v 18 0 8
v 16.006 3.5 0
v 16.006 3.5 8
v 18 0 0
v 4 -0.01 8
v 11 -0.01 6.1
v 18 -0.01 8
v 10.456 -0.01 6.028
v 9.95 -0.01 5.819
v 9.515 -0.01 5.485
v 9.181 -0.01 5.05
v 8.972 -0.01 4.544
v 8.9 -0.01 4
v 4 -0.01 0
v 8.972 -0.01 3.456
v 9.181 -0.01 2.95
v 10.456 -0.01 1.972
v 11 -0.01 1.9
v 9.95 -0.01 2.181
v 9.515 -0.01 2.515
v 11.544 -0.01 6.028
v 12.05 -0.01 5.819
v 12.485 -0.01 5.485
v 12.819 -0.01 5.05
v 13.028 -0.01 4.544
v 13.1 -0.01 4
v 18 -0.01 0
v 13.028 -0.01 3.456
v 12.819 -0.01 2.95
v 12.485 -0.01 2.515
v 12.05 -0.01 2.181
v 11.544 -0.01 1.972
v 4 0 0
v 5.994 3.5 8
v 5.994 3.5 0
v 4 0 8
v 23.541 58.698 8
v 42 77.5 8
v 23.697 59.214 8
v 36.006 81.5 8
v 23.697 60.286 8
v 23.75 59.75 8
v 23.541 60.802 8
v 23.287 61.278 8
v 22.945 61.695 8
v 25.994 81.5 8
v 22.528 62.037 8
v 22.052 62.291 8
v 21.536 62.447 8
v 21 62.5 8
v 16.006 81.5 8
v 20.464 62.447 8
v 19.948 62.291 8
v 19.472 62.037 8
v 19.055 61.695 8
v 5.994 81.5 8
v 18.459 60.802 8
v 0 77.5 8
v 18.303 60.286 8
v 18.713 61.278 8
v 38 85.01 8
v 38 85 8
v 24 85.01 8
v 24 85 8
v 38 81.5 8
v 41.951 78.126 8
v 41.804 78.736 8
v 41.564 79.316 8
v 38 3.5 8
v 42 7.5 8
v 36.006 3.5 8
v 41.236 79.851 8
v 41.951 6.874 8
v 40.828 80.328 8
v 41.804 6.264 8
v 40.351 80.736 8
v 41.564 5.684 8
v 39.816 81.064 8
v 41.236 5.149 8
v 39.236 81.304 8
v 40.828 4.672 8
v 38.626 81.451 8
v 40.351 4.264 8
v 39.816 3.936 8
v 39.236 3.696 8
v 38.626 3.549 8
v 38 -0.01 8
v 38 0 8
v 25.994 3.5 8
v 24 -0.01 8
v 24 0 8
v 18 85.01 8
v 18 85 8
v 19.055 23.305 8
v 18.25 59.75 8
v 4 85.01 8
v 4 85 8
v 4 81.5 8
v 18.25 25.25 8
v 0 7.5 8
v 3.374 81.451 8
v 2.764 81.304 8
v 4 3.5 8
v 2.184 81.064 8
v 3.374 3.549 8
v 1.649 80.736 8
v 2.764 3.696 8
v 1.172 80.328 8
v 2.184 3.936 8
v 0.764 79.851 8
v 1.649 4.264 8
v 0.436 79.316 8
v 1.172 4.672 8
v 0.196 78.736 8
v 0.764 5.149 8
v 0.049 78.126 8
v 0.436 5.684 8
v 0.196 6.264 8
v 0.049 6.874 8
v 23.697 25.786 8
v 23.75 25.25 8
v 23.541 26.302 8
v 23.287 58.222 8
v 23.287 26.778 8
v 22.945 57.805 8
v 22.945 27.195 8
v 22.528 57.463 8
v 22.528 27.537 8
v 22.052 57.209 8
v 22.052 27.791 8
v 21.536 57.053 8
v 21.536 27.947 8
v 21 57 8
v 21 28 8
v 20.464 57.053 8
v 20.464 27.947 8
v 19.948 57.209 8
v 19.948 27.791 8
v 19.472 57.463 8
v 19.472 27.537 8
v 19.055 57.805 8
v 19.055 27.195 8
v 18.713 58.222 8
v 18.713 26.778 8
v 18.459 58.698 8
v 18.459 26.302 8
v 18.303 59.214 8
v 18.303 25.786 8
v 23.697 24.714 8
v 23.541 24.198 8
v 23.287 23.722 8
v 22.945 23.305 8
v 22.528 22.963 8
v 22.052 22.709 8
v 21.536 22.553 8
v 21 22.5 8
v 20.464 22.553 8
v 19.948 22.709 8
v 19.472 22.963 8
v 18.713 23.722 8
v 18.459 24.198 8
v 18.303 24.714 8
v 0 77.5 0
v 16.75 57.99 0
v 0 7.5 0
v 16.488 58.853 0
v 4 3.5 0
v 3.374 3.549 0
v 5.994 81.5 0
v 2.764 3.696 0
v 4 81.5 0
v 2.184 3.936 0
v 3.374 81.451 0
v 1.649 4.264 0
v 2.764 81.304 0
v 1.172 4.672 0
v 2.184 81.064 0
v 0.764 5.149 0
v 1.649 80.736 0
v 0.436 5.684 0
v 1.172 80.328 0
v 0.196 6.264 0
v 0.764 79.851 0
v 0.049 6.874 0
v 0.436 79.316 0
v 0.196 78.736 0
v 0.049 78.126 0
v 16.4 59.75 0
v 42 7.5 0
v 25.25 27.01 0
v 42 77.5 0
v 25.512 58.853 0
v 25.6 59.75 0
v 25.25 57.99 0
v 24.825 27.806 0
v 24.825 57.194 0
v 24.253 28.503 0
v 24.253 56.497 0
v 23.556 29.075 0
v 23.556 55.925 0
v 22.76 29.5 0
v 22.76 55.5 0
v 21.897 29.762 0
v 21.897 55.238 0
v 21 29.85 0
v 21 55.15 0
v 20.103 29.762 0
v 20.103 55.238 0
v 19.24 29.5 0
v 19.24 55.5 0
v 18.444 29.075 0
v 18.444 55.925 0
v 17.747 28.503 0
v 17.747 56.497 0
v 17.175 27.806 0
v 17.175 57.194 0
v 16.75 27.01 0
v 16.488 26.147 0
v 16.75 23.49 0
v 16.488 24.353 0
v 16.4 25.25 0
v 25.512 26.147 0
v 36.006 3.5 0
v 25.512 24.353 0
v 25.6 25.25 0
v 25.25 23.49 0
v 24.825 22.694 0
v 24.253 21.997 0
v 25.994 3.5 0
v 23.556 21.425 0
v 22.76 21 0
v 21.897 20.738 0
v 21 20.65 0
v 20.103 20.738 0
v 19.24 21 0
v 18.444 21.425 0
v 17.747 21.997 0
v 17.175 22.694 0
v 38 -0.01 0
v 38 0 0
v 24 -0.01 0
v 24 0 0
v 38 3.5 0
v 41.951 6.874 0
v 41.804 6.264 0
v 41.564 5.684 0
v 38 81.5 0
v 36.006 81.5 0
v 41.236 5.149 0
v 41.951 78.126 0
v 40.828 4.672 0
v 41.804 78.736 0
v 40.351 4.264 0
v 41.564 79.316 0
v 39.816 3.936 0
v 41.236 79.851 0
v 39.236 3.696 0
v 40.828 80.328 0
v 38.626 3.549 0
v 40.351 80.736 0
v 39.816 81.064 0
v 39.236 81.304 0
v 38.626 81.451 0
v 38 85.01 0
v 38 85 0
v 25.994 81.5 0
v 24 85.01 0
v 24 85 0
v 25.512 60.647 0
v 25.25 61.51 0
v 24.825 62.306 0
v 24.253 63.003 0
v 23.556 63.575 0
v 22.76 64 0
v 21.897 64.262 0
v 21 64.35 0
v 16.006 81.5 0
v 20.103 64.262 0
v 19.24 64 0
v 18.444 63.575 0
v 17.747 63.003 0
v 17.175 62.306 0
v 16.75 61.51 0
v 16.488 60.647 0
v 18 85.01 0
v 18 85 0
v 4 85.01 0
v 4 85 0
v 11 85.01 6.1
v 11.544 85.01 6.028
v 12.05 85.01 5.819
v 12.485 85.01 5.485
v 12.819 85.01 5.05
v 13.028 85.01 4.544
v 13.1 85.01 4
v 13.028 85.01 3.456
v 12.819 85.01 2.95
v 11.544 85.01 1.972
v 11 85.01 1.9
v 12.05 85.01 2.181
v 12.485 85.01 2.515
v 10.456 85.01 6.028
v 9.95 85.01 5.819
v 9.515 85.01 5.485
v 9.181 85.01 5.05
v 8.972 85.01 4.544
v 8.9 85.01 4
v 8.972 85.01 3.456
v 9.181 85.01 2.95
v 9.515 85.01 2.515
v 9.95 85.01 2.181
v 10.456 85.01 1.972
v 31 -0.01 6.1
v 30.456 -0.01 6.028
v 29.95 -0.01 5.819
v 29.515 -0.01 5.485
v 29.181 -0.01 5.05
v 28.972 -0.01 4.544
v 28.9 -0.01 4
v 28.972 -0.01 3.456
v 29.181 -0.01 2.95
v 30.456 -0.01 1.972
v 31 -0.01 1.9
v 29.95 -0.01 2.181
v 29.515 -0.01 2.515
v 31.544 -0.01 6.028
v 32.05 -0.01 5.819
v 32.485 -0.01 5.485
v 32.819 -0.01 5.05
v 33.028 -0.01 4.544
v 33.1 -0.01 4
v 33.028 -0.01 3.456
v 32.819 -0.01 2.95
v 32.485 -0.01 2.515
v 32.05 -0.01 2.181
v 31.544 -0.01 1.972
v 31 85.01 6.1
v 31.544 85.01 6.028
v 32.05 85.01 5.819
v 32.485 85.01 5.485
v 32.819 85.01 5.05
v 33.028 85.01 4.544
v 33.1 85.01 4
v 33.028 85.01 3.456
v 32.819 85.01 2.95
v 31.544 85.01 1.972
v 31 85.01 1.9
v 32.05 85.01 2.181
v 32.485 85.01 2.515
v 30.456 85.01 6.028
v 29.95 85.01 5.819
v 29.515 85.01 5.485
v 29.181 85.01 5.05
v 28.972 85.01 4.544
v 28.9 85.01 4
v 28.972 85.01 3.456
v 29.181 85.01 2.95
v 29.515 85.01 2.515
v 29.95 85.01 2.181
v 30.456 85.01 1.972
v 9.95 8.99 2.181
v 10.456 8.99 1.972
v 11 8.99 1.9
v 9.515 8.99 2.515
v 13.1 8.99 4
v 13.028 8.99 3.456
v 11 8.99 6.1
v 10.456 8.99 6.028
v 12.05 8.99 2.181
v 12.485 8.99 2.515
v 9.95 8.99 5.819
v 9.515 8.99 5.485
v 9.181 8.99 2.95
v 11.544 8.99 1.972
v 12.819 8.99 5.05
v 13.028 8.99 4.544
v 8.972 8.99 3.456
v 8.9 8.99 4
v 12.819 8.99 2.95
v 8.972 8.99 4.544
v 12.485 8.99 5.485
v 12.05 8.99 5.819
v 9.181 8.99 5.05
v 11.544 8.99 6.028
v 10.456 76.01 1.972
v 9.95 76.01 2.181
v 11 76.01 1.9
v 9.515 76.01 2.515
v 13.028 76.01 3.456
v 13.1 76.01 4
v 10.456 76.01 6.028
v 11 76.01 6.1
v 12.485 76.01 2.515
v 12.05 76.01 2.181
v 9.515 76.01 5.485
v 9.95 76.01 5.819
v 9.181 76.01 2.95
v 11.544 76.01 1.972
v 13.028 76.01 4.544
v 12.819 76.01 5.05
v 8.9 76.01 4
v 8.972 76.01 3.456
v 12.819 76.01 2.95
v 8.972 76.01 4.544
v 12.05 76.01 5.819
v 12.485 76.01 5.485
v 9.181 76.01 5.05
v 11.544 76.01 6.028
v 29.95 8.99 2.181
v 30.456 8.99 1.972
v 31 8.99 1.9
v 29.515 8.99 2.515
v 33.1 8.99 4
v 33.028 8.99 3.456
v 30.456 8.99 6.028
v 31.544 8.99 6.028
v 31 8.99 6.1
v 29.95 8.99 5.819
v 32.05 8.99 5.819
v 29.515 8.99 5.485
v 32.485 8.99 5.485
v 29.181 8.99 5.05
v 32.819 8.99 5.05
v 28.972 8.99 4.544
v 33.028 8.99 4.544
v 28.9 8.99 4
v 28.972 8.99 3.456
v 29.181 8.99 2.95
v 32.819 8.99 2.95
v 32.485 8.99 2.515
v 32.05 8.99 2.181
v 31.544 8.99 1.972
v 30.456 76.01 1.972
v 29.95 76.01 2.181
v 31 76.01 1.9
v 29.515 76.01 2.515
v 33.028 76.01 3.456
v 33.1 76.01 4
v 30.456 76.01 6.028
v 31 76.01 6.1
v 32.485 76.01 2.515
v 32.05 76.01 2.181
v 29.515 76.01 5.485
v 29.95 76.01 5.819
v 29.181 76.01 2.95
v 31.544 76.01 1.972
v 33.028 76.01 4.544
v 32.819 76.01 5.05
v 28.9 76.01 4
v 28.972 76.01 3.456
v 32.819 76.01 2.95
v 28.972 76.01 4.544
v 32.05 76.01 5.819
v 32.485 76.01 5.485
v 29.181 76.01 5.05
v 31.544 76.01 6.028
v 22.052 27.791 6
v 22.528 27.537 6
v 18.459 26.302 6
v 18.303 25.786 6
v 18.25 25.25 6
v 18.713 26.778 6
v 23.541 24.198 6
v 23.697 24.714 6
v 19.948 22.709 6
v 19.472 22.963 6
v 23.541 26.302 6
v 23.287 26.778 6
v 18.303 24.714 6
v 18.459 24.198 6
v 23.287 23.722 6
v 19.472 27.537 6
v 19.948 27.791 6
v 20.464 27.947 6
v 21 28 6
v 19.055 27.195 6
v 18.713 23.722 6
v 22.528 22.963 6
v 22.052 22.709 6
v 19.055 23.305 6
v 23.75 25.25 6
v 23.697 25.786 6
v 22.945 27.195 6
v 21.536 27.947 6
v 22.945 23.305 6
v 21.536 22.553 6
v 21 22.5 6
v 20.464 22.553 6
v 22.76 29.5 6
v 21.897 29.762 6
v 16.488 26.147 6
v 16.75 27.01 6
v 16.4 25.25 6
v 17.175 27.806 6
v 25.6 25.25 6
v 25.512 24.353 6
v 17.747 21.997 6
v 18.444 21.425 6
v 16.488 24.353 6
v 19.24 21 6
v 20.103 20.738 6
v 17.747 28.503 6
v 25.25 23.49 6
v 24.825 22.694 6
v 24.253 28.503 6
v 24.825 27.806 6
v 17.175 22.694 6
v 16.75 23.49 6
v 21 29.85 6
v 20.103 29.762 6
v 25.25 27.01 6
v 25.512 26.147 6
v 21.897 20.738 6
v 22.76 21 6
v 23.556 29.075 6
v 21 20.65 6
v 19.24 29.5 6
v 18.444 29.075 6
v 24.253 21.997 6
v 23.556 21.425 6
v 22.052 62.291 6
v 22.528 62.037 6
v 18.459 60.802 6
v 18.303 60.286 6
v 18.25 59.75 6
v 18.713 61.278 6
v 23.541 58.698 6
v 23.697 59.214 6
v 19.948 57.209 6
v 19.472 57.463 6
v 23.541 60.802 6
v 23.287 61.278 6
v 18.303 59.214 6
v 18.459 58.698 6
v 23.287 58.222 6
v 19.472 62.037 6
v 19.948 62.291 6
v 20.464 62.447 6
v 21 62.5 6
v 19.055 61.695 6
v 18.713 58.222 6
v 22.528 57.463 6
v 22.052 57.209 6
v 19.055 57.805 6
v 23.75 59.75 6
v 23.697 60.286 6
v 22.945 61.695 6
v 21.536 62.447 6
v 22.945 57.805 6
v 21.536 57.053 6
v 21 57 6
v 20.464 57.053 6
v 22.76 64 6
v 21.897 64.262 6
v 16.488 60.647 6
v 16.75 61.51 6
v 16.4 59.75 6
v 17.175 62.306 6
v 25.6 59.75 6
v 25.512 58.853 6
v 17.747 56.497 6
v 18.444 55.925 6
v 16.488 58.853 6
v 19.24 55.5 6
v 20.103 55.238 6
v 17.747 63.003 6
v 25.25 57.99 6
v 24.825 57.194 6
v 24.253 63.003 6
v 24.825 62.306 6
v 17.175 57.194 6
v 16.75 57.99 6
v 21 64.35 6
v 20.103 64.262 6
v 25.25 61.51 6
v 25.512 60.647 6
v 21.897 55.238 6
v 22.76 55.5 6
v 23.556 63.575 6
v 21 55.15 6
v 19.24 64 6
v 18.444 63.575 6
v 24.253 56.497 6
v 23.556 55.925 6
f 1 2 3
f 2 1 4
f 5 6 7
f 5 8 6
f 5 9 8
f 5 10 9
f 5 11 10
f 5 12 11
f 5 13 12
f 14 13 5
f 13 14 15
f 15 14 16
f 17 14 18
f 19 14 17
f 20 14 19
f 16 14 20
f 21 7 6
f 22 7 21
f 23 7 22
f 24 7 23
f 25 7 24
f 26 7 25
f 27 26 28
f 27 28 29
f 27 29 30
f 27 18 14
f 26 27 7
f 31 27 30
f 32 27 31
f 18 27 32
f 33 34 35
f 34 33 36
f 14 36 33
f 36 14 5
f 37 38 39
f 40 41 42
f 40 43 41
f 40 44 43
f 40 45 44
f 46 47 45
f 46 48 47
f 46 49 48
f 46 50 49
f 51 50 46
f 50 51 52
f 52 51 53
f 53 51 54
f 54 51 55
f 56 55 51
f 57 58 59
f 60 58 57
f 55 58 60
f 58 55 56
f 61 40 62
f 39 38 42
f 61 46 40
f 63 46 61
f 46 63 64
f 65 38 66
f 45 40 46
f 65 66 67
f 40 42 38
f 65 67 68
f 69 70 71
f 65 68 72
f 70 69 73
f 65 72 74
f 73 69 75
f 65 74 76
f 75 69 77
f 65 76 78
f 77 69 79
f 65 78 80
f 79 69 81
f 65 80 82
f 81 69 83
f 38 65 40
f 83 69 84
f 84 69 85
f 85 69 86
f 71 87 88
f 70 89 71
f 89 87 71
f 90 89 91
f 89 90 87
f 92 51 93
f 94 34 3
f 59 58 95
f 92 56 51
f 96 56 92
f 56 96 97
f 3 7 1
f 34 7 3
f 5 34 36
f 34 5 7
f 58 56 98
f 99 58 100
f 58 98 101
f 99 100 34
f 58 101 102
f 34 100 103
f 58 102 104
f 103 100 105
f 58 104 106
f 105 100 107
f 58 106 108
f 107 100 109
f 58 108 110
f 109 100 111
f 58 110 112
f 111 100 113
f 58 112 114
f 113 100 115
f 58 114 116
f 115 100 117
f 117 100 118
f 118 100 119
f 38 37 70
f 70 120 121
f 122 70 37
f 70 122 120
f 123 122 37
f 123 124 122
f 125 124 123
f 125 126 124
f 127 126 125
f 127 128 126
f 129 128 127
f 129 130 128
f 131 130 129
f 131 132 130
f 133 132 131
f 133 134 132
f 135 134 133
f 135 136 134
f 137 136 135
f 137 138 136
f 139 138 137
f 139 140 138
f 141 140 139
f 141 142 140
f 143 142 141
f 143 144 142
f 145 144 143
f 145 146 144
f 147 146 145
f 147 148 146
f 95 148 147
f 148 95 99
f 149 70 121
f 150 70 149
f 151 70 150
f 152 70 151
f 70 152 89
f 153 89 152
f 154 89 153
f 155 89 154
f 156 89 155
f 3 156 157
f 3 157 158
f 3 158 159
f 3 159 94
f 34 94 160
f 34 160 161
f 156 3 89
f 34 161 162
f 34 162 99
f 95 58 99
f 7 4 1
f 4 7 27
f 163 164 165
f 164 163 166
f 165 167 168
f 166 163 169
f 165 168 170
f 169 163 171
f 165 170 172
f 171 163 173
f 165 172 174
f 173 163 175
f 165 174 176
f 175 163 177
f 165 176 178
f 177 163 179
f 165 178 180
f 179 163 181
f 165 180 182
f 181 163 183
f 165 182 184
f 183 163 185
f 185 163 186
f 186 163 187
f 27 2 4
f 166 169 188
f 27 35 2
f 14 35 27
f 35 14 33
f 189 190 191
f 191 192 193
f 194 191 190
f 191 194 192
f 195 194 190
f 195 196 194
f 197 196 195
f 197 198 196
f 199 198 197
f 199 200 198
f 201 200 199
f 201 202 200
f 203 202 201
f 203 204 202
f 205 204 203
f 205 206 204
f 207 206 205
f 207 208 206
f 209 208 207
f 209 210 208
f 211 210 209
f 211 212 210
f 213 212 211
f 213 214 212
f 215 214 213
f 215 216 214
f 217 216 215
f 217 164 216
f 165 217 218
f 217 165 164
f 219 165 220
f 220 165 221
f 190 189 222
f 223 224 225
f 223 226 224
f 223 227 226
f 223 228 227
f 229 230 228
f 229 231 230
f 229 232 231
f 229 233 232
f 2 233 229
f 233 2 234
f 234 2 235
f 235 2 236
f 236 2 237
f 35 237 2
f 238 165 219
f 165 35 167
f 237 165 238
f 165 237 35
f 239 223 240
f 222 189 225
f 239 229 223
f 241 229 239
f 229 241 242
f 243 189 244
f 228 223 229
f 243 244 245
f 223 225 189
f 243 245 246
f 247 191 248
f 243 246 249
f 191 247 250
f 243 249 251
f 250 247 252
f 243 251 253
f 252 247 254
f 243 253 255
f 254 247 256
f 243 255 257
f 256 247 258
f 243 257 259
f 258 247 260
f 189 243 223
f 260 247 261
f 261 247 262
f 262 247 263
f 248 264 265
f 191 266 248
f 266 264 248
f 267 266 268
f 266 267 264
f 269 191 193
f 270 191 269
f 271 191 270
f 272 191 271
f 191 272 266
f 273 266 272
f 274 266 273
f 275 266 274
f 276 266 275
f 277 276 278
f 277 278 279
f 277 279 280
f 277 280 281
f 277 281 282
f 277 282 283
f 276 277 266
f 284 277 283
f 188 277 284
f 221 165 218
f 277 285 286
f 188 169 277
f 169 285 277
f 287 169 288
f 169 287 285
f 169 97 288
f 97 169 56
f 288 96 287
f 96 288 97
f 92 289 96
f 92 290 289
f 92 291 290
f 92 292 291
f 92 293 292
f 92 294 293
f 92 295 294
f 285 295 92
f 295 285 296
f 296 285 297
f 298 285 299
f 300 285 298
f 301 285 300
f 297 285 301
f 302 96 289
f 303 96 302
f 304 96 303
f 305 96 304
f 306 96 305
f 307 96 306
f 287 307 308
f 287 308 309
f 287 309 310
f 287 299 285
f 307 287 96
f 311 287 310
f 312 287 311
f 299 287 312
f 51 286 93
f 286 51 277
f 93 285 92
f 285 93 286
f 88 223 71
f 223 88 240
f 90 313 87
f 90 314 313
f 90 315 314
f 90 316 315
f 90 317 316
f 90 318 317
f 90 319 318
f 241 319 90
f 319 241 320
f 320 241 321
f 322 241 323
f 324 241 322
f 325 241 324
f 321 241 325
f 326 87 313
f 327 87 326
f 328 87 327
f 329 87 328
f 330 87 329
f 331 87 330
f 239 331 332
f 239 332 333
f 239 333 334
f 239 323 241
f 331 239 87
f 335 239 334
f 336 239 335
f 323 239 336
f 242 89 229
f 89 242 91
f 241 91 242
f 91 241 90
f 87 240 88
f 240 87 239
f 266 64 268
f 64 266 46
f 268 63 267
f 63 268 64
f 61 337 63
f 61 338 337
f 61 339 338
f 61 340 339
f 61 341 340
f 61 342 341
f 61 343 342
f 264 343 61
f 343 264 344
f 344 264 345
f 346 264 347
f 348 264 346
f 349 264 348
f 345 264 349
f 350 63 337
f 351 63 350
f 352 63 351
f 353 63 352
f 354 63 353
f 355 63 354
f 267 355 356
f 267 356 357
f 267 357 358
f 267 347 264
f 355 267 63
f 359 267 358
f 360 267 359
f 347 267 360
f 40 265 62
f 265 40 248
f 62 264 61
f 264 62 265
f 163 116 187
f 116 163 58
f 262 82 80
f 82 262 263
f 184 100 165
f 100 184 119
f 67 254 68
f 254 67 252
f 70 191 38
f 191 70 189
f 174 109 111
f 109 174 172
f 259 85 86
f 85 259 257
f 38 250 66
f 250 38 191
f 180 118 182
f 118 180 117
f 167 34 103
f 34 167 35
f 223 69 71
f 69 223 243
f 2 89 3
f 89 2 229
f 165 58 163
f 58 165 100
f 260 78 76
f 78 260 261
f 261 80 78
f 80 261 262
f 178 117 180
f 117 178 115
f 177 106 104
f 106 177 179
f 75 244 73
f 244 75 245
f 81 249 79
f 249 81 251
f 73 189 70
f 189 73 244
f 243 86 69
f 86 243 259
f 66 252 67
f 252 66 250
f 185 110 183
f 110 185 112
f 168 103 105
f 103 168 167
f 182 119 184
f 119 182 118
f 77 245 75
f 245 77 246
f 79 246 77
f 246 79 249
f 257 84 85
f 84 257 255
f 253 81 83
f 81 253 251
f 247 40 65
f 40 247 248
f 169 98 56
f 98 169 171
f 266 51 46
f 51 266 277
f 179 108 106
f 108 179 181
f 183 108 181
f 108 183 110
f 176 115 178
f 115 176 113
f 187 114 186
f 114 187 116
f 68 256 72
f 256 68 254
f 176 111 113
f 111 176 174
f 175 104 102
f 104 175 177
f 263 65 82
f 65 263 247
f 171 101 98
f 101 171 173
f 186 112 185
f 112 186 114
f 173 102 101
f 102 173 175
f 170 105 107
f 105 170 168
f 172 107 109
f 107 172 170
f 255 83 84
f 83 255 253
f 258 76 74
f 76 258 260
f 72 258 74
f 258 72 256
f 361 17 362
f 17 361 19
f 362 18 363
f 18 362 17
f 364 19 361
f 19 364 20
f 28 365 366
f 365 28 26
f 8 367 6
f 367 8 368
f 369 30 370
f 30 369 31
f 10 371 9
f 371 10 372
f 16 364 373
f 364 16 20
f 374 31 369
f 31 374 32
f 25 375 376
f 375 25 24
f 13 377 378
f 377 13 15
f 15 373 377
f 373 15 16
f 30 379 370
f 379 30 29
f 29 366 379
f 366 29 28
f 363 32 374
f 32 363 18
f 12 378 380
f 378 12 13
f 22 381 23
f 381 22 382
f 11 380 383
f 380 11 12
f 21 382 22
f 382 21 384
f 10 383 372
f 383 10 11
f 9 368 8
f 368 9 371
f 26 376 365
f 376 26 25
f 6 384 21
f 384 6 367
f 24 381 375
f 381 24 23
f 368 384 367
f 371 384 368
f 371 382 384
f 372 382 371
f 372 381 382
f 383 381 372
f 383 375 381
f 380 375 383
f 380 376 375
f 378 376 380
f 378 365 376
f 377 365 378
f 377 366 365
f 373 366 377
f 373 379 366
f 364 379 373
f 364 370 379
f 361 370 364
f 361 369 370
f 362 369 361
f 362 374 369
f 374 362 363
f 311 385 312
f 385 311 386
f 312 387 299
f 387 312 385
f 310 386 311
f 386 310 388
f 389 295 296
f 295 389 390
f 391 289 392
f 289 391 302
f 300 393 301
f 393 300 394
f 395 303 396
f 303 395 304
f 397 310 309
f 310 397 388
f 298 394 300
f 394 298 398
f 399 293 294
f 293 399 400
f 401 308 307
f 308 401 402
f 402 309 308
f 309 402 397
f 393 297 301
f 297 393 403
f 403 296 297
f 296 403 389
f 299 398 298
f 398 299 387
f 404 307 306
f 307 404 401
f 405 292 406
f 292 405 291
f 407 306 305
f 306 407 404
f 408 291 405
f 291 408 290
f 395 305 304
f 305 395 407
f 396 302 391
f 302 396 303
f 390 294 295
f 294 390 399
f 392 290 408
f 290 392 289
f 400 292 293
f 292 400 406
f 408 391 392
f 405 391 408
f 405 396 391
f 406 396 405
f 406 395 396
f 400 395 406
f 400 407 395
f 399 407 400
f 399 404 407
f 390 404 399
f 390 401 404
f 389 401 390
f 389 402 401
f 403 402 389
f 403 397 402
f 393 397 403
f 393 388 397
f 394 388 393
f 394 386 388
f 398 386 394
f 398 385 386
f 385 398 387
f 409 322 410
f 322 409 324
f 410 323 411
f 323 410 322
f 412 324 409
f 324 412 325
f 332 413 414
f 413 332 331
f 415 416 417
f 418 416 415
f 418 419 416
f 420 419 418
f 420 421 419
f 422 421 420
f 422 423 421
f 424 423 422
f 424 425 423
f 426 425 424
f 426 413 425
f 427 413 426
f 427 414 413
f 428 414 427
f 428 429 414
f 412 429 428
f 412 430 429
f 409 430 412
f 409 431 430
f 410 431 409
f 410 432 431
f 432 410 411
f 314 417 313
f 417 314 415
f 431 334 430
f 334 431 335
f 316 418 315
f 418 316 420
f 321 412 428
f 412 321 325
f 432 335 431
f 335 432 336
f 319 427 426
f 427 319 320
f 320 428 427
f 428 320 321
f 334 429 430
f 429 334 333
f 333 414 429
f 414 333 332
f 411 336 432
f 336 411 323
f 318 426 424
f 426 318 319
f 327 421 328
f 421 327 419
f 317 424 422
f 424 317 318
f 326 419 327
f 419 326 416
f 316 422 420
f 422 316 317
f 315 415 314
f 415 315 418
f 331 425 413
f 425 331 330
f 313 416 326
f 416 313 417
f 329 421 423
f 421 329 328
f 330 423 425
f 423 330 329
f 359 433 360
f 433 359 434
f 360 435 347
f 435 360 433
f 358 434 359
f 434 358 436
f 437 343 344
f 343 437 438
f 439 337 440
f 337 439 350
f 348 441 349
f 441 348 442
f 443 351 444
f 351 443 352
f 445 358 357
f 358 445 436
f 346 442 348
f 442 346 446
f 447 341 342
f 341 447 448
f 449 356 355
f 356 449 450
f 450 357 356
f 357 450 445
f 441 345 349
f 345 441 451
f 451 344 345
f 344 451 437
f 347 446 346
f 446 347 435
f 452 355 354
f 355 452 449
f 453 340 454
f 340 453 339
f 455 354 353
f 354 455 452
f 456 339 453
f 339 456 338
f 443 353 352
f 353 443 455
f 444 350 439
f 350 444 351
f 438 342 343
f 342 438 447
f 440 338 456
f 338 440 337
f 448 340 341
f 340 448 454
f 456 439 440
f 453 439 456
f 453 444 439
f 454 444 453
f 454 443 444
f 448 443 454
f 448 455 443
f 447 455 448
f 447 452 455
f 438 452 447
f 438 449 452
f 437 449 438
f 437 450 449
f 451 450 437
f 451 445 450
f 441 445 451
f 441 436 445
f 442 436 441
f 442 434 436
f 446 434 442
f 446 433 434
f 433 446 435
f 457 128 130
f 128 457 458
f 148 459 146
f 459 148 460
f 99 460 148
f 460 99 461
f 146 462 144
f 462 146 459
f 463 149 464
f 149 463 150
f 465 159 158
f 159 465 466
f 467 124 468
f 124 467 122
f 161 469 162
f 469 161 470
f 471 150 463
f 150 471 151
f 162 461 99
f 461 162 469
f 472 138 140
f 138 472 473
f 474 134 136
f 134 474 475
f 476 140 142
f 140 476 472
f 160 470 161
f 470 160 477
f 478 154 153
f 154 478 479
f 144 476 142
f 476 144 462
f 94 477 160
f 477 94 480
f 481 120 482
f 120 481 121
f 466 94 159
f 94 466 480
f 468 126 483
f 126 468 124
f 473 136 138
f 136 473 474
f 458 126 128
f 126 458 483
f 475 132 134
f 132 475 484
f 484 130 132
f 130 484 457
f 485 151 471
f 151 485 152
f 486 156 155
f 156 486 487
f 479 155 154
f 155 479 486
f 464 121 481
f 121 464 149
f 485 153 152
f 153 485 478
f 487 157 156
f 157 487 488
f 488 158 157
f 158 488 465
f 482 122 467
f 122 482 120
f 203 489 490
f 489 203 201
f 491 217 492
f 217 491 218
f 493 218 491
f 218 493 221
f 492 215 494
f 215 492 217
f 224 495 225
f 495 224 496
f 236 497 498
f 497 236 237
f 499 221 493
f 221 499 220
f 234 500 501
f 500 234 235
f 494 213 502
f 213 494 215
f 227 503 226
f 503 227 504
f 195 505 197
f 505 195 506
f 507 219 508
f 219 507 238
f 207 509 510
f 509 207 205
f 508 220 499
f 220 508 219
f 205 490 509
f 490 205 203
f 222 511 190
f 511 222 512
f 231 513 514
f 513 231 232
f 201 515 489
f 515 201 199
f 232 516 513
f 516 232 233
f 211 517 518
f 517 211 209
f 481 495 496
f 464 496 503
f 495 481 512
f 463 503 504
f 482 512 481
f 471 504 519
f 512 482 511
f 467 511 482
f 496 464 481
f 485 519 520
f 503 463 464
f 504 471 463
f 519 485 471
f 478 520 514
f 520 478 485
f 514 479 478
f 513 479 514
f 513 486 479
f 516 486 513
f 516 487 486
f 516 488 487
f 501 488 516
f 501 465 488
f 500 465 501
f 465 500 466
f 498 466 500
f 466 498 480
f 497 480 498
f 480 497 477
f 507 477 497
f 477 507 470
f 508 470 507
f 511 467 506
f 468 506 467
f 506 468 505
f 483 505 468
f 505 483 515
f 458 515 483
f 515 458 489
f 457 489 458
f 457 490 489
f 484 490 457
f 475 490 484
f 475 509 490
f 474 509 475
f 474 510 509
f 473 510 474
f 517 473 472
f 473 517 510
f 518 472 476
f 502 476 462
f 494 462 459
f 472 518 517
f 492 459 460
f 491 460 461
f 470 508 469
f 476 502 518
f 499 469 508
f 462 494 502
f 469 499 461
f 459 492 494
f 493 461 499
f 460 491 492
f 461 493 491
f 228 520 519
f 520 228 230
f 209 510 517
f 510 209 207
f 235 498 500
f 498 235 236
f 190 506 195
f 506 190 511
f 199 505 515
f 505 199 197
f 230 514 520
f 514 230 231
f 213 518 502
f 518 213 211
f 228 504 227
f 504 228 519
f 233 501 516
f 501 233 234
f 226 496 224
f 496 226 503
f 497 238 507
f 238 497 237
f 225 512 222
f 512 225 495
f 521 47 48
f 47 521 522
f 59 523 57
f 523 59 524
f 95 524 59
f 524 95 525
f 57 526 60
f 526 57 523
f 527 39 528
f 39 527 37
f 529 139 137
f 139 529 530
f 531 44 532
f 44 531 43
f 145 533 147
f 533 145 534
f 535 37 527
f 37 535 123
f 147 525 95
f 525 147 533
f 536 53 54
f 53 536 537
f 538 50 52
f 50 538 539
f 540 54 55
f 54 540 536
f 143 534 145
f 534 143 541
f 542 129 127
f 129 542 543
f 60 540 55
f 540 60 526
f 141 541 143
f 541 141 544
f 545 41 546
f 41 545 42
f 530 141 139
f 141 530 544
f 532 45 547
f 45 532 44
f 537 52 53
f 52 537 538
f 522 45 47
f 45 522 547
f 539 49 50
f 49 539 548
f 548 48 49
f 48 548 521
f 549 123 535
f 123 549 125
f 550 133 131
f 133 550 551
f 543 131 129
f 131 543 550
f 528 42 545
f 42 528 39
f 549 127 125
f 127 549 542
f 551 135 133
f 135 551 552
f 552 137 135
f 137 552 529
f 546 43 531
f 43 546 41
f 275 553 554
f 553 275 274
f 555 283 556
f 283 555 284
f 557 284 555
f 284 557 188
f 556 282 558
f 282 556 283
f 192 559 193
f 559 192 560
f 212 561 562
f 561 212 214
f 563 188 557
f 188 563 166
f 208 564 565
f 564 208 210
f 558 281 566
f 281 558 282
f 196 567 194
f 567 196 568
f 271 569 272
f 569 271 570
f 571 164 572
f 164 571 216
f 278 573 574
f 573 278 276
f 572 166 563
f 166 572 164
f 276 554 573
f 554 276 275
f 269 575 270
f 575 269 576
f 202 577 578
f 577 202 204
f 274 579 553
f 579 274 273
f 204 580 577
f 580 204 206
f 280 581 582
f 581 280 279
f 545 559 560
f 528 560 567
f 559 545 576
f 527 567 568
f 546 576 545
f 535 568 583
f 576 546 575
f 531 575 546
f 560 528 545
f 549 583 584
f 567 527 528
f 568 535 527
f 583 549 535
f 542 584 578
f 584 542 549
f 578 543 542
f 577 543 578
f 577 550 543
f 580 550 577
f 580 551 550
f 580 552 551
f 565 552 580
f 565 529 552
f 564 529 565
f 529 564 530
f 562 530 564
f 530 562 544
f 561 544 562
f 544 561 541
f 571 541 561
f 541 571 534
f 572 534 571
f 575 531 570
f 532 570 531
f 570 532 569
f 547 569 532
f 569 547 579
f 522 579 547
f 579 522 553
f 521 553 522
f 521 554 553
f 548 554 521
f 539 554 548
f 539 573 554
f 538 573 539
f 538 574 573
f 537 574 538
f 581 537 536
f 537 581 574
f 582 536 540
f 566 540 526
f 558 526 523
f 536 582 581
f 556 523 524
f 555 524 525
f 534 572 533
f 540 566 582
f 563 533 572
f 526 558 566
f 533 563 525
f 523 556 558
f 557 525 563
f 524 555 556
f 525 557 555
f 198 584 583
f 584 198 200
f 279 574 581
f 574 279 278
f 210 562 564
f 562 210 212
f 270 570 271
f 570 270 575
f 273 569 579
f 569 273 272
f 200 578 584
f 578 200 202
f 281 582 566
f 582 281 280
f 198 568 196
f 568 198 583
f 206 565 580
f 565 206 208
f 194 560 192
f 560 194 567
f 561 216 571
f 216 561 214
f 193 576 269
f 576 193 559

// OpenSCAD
include <../lib/meshtastic-drybag-node-lib.scad>;
$fn = 40;
cheek_print(true);
